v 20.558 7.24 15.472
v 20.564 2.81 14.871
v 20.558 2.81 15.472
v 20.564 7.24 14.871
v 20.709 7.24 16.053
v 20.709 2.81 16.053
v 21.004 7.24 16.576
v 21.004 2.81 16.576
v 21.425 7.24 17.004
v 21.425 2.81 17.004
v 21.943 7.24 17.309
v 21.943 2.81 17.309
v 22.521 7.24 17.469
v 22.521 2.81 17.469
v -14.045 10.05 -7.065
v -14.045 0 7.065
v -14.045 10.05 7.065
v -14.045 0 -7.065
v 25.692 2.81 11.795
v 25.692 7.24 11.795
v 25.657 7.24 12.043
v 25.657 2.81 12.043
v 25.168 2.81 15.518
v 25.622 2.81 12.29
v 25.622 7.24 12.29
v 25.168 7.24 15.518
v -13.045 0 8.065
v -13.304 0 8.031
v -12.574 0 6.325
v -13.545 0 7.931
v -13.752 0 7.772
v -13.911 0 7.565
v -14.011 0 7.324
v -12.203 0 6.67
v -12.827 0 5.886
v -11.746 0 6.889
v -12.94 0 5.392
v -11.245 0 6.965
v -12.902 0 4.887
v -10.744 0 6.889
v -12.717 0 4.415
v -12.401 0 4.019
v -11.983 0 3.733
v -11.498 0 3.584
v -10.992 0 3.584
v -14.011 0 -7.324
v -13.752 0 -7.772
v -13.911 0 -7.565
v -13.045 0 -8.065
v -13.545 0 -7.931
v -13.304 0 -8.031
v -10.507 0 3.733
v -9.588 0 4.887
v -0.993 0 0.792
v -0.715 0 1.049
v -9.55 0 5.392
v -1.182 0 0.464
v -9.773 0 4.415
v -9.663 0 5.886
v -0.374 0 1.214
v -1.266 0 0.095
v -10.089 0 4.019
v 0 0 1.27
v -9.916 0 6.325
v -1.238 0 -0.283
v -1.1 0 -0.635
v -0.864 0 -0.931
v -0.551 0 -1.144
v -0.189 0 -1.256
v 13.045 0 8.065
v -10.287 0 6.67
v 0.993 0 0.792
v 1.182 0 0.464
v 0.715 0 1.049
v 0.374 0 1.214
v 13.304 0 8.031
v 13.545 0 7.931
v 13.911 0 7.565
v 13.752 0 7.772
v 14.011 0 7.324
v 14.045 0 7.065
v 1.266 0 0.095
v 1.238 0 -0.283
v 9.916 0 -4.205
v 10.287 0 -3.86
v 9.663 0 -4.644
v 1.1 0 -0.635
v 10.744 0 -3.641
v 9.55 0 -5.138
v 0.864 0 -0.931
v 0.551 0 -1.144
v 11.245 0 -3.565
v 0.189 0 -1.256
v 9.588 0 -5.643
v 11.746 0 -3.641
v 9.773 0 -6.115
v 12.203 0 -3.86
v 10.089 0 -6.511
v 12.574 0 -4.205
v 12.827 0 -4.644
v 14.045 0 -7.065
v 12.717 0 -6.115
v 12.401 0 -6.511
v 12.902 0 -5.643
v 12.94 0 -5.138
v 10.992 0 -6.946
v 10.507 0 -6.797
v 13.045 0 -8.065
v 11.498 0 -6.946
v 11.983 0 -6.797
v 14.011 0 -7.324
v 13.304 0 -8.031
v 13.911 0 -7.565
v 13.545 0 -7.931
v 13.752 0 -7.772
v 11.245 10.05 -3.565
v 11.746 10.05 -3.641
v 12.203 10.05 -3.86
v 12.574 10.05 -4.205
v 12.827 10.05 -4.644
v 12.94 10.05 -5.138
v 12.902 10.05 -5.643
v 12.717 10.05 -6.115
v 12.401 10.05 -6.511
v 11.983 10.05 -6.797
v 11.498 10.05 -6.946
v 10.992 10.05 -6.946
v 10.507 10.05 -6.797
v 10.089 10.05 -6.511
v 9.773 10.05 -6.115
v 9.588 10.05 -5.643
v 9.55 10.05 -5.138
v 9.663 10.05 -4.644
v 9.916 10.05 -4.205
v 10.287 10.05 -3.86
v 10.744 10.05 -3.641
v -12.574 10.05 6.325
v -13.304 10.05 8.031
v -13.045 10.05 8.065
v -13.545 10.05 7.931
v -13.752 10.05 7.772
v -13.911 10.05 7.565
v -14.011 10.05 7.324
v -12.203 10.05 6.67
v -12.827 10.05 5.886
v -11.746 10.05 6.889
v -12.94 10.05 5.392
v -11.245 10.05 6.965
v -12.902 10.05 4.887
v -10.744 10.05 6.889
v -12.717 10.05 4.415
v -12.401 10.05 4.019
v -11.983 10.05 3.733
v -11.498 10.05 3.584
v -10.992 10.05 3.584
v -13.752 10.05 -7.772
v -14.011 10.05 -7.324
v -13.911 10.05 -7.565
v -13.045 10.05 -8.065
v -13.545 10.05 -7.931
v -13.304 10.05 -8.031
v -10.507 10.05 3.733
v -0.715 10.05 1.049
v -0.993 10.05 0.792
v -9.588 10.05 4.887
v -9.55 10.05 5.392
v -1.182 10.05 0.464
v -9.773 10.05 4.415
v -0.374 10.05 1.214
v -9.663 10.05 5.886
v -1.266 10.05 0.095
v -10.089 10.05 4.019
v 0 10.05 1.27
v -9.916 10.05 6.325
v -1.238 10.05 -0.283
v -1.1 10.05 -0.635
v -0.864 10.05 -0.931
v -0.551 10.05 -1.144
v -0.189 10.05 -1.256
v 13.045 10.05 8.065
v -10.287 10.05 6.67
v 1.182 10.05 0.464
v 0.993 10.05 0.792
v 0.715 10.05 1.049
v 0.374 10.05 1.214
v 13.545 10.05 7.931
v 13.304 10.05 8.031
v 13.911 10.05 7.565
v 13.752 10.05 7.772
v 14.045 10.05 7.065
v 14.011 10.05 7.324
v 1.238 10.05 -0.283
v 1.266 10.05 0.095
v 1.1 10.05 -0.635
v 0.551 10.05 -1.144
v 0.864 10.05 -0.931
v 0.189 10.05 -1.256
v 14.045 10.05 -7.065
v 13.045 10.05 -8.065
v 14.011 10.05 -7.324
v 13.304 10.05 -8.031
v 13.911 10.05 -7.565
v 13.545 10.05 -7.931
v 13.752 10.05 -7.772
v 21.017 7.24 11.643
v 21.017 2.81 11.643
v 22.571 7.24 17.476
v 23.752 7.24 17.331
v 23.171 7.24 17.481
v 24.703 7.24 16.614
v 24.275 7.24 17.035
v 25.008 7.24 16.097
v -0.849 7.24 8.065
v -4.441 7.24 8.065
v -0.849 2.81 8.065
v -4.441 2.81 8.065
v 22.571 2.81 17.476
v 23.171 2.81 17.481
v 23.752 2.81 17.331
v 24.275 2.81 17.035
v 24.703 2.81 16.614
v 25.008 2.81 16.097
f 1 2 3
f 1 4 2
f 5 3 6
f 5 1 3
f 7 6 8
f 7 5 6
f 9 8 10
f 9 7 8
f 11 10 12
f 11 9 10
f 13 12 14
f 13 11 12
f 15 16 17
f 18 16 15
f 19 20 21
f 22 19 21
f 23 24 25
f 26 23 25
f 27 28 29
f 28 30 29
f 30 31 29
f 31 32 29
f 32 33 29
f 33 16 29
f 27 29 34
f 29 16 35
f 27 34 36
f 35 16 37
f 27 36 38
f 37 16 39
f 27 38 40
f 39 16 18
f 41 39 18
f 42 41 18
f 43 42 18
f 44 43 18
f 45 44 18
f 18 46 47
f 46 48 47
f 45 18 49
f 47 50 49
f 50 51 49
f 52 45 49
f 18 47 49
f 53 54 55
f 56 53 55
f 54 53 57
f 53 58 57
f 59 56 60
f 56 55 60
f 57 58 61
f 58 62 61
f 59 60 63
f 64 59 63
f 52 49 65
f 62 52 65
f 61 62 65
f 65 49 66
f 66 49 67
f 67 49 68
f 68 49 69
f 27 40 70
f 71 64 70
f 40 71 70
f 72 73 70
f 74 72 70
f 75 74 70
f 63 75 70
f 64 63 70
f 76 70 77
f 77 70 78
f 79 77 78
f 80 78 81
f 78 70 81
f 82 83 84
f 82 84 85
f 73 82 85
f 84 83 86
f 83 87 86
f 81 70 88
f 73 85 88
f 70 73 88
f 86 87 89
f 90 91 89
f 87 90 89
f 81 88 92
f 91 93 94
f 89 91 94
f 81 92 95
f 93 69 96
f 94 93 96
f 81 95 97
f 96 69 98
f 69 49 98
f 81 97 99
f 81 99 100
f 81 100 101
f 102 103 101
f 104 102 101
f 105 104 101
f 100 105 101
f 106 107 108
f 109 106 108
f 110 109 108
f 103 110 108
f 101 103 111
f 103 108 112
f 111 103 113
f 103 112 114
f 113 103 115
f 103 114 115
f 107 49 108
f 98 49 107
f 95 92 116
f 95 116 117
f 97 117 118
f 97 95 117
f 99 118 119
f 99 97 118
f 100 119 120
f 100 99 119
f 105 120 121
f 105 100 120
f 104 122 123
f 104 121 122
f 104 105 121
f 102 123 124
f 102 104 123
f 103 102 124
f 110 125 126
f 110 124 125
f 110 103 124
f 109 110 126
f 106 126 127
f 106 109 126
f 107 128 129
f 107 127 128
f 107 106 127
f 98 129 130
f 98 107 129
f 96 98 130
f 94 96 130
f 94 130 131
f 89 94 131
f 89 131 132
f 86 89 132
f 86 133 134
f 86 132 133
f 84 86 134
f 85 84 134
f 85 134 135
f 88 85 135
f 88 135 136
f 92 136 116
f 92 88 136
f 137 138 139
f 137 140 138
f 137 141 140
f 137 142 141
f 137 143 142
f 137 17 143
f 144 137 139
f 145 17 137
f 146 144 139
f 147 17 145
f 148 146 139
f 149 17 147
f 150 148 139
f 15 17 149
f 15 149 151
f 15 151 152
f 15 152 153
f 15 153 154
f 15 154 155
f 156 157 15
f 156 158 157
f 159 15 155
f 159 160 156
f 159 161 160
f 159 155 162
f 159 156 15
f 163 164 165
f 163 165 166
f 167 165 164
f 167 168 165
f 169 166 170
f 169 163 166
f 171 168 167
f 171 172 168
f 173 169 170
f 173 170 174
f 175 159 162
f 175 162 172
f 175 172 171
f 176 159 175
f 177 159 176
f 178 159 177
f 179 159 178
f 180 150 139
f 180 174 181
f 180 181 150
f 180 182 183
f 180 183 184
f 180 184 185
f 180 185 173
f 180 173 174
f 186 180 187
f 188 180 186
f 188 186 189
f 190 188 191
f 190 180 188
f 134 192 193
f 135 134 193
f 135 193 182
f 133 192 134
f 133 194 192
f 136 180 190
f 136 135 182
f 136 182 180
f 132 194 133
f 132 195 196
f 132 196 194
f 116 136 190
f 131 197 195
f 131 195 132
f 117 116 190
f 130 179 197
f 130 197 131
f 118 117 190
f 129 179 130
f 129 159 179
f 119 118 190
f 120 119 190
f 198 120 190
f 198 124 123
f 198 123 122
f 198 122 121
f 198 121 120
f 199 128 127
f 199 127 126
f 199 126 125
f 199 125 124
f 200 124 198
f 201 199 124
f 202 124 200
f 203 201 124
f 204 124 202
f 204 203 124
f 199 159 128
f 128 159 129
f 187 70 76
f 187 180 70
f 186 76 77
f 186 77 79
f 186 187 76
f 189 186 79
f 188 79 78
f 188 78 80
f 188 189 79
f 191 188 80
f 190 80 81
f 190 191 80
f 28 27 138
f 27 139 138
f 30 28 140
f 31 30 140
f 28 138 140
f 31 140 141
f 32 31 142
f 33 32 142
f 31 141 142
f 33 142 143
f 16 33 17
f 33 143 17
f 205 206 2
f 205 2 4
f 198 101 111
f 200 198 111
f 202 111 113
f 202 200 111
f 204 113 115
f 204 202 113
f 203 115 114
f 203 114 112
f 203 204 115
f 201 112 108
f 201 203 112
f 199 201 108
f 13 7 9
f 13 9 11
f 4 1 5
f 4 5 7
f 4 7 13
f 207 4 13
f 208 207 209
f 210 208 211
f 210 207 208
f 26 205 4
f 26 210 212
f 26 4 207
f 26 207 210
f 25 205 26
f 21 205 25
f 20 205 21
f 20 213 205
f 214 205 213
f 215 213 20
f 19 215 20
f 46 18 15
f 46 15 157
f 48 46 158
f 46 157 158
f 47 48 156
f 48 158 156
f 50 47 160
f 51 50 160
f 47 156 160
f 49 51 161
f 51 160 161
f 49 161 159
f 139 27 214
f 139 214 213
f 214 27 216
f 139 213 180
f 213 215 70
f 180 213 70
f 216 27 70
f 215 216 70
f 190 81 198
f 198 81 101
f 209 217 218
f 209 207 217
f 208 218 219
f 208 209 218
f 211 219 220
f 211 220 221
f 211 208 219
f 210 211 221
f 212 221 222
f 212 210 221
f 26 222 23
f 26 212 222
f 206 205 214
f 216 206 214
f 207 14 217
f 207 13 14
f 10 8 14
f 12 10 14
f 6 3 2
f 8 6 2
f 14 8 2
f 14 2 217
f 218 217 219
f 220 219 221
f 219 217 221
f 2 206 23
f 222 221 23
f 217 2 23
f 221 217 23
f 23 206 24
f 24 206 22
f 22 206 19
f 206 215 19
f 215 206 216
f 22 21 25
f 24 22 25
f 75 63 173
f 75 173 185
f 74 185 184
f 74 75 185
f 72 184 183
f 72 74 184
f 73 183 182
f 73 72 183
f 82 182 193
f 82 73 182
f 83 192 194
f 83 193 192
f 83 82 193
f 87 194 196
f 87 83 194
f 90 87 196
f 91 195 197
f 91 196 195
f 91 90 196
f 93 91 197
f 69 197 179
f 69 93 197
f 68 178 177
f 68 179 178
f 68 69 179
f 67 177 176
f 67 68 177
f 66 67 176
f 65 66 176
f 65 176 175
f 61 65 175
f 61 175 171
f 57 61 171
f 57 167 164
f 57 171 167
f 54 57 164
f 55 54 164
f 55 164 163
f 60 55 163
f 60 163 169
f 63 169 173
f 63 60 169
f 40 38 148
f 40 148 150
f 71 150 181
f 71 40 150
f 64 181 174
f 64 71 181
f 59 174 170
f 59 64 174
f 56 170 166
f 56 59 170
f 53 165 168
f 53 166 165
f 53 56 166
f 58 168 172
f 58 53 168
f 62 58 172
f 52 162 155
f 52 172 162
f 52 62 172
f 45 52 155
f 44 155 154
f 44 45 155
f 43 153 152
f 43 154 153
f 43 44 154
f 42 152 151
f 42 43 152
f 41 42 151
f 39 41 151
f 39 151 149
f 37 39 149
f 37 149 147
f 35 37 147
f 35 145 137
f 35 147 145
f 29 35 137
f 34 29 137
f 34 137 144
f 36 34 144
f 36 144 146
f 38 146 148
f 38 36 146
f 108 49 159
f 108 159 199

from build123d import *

# Parameters (mm, degrees)
SKETCH1_W               = 28.09
SKETCH1_H               = 16.13
BOSS_EXTRUDE1_DEPTH     = 10.05
BOSS_EXTRUDE2_DEPTH     = 2.215
FILLET1_R               = 1
CUT_EXTRUDE1_DEPTH      = 29.919874566
CUT_EXTRUDE1_DEPTH_BACK = 29.919874566
SKETCH4_R               = 1.7
SKETCH4_R_2             = 1.27
SKETCH6_W               = 4.65
SKETCH6_H               = 4.43
BOSS_EXTRUDE3_DEPTH     = 5.56
FILLET2_R               = 2.3


with BuildPart() as part:
    # Sketch1 → Boss-Extrude1 (new body)
    with BuildSketch(Plane(origin=(0, 0, 0), x_dir=(1, 0, 0), z_dir=(0, 1, 0))):
        Rectangle(SKETCH1_W, SKETCH1_H)
    extrude(amount=BOSS_EXTRUDE1_DEPTH)

    # Sketch3 → Boss-Extrude2 (add, symmetric)
    with BuildSketch(Plane(origin=(0, 5.025, 0), x_dir=(1, 0, 0), z_dir=(0, 1, 0))):
        Polygon((25.656861405, -12.042567225), (25.622068129, -12.290134243), (-4.441324134, -8.065), (-4.371737583, -7.569865966), (25.69165468, -11.795000208), align=None)
    extrude(amount=BOSS_EXTRUDE2_DEPTH, both=True)

    # Fillet1
    fillet1_edges = [part.edges().sort_by_distance(p)[0] for p in [
        (14.045, 5.025, 8.065),
        (-14.045, 5.025, 8.065),
        (-14.045, 5.025, -8.065),
        (14.045, 5.025, -8.065),
    ]]
    fillet(fillet1_edges, radius=FILLET1_R)

    # Sketch4 → Cut-Extrude1 (cut, two sides: drawn at the far end of the back side and taken through both)
    with BuildSketch(Plane(origin=(0, 5.025, 0), x_dir=(1, 0, 0), z_dir=(0, 1, 0)).offset(-CUT_EXTRUDE1_DEPTH_BACK)):
        with Locations(Location((11.245, 5.265, 0), (0, 0, 270))):
            Circle(SKETCH4_R)
        with Locations(Location((-11.245, -5.265, 0), (0, 0, 270))):
            Circle(SKETCH4_R)
        with Locations(Location((0, 0, 0), (0, 0, 270))):
            Circle(SKETCH4_R_2)
    extrude(amount=CUT_EXTRUDE1_DEPTH + CUT_EXTRUDE1_DEPTH_BACK, mode=Mode.SUBTRACT)

    # Sketch6 → Boss-Extrude3 (add)
    with BuildSketch(Plane(origin=(-1.19753232, 0, 8.520885209), x_dir=(0.9902680687415704, 0, 0.13917310096006527), z_dir=(-0.13917310096006527, 0, 0.9902680687415704))):
        with Locations((24.758172017, 5.025)):
            Rectangle(SKETCH6_W, SKETCH6_H)
    extrude(amount=BOSS_EXTRUDE3_DEPTH)

    # Fillet2
    fillet2_edges = [part.edges().sort_by_distance(p)[0] for p in [
        (24.848265688, 5.025, 17.796024705),
        (20.243519168, 5.025, 17.148869785),
    ]]
    fillet(fillet2_edges, radius=FILLET2_R)


solid = part.part
